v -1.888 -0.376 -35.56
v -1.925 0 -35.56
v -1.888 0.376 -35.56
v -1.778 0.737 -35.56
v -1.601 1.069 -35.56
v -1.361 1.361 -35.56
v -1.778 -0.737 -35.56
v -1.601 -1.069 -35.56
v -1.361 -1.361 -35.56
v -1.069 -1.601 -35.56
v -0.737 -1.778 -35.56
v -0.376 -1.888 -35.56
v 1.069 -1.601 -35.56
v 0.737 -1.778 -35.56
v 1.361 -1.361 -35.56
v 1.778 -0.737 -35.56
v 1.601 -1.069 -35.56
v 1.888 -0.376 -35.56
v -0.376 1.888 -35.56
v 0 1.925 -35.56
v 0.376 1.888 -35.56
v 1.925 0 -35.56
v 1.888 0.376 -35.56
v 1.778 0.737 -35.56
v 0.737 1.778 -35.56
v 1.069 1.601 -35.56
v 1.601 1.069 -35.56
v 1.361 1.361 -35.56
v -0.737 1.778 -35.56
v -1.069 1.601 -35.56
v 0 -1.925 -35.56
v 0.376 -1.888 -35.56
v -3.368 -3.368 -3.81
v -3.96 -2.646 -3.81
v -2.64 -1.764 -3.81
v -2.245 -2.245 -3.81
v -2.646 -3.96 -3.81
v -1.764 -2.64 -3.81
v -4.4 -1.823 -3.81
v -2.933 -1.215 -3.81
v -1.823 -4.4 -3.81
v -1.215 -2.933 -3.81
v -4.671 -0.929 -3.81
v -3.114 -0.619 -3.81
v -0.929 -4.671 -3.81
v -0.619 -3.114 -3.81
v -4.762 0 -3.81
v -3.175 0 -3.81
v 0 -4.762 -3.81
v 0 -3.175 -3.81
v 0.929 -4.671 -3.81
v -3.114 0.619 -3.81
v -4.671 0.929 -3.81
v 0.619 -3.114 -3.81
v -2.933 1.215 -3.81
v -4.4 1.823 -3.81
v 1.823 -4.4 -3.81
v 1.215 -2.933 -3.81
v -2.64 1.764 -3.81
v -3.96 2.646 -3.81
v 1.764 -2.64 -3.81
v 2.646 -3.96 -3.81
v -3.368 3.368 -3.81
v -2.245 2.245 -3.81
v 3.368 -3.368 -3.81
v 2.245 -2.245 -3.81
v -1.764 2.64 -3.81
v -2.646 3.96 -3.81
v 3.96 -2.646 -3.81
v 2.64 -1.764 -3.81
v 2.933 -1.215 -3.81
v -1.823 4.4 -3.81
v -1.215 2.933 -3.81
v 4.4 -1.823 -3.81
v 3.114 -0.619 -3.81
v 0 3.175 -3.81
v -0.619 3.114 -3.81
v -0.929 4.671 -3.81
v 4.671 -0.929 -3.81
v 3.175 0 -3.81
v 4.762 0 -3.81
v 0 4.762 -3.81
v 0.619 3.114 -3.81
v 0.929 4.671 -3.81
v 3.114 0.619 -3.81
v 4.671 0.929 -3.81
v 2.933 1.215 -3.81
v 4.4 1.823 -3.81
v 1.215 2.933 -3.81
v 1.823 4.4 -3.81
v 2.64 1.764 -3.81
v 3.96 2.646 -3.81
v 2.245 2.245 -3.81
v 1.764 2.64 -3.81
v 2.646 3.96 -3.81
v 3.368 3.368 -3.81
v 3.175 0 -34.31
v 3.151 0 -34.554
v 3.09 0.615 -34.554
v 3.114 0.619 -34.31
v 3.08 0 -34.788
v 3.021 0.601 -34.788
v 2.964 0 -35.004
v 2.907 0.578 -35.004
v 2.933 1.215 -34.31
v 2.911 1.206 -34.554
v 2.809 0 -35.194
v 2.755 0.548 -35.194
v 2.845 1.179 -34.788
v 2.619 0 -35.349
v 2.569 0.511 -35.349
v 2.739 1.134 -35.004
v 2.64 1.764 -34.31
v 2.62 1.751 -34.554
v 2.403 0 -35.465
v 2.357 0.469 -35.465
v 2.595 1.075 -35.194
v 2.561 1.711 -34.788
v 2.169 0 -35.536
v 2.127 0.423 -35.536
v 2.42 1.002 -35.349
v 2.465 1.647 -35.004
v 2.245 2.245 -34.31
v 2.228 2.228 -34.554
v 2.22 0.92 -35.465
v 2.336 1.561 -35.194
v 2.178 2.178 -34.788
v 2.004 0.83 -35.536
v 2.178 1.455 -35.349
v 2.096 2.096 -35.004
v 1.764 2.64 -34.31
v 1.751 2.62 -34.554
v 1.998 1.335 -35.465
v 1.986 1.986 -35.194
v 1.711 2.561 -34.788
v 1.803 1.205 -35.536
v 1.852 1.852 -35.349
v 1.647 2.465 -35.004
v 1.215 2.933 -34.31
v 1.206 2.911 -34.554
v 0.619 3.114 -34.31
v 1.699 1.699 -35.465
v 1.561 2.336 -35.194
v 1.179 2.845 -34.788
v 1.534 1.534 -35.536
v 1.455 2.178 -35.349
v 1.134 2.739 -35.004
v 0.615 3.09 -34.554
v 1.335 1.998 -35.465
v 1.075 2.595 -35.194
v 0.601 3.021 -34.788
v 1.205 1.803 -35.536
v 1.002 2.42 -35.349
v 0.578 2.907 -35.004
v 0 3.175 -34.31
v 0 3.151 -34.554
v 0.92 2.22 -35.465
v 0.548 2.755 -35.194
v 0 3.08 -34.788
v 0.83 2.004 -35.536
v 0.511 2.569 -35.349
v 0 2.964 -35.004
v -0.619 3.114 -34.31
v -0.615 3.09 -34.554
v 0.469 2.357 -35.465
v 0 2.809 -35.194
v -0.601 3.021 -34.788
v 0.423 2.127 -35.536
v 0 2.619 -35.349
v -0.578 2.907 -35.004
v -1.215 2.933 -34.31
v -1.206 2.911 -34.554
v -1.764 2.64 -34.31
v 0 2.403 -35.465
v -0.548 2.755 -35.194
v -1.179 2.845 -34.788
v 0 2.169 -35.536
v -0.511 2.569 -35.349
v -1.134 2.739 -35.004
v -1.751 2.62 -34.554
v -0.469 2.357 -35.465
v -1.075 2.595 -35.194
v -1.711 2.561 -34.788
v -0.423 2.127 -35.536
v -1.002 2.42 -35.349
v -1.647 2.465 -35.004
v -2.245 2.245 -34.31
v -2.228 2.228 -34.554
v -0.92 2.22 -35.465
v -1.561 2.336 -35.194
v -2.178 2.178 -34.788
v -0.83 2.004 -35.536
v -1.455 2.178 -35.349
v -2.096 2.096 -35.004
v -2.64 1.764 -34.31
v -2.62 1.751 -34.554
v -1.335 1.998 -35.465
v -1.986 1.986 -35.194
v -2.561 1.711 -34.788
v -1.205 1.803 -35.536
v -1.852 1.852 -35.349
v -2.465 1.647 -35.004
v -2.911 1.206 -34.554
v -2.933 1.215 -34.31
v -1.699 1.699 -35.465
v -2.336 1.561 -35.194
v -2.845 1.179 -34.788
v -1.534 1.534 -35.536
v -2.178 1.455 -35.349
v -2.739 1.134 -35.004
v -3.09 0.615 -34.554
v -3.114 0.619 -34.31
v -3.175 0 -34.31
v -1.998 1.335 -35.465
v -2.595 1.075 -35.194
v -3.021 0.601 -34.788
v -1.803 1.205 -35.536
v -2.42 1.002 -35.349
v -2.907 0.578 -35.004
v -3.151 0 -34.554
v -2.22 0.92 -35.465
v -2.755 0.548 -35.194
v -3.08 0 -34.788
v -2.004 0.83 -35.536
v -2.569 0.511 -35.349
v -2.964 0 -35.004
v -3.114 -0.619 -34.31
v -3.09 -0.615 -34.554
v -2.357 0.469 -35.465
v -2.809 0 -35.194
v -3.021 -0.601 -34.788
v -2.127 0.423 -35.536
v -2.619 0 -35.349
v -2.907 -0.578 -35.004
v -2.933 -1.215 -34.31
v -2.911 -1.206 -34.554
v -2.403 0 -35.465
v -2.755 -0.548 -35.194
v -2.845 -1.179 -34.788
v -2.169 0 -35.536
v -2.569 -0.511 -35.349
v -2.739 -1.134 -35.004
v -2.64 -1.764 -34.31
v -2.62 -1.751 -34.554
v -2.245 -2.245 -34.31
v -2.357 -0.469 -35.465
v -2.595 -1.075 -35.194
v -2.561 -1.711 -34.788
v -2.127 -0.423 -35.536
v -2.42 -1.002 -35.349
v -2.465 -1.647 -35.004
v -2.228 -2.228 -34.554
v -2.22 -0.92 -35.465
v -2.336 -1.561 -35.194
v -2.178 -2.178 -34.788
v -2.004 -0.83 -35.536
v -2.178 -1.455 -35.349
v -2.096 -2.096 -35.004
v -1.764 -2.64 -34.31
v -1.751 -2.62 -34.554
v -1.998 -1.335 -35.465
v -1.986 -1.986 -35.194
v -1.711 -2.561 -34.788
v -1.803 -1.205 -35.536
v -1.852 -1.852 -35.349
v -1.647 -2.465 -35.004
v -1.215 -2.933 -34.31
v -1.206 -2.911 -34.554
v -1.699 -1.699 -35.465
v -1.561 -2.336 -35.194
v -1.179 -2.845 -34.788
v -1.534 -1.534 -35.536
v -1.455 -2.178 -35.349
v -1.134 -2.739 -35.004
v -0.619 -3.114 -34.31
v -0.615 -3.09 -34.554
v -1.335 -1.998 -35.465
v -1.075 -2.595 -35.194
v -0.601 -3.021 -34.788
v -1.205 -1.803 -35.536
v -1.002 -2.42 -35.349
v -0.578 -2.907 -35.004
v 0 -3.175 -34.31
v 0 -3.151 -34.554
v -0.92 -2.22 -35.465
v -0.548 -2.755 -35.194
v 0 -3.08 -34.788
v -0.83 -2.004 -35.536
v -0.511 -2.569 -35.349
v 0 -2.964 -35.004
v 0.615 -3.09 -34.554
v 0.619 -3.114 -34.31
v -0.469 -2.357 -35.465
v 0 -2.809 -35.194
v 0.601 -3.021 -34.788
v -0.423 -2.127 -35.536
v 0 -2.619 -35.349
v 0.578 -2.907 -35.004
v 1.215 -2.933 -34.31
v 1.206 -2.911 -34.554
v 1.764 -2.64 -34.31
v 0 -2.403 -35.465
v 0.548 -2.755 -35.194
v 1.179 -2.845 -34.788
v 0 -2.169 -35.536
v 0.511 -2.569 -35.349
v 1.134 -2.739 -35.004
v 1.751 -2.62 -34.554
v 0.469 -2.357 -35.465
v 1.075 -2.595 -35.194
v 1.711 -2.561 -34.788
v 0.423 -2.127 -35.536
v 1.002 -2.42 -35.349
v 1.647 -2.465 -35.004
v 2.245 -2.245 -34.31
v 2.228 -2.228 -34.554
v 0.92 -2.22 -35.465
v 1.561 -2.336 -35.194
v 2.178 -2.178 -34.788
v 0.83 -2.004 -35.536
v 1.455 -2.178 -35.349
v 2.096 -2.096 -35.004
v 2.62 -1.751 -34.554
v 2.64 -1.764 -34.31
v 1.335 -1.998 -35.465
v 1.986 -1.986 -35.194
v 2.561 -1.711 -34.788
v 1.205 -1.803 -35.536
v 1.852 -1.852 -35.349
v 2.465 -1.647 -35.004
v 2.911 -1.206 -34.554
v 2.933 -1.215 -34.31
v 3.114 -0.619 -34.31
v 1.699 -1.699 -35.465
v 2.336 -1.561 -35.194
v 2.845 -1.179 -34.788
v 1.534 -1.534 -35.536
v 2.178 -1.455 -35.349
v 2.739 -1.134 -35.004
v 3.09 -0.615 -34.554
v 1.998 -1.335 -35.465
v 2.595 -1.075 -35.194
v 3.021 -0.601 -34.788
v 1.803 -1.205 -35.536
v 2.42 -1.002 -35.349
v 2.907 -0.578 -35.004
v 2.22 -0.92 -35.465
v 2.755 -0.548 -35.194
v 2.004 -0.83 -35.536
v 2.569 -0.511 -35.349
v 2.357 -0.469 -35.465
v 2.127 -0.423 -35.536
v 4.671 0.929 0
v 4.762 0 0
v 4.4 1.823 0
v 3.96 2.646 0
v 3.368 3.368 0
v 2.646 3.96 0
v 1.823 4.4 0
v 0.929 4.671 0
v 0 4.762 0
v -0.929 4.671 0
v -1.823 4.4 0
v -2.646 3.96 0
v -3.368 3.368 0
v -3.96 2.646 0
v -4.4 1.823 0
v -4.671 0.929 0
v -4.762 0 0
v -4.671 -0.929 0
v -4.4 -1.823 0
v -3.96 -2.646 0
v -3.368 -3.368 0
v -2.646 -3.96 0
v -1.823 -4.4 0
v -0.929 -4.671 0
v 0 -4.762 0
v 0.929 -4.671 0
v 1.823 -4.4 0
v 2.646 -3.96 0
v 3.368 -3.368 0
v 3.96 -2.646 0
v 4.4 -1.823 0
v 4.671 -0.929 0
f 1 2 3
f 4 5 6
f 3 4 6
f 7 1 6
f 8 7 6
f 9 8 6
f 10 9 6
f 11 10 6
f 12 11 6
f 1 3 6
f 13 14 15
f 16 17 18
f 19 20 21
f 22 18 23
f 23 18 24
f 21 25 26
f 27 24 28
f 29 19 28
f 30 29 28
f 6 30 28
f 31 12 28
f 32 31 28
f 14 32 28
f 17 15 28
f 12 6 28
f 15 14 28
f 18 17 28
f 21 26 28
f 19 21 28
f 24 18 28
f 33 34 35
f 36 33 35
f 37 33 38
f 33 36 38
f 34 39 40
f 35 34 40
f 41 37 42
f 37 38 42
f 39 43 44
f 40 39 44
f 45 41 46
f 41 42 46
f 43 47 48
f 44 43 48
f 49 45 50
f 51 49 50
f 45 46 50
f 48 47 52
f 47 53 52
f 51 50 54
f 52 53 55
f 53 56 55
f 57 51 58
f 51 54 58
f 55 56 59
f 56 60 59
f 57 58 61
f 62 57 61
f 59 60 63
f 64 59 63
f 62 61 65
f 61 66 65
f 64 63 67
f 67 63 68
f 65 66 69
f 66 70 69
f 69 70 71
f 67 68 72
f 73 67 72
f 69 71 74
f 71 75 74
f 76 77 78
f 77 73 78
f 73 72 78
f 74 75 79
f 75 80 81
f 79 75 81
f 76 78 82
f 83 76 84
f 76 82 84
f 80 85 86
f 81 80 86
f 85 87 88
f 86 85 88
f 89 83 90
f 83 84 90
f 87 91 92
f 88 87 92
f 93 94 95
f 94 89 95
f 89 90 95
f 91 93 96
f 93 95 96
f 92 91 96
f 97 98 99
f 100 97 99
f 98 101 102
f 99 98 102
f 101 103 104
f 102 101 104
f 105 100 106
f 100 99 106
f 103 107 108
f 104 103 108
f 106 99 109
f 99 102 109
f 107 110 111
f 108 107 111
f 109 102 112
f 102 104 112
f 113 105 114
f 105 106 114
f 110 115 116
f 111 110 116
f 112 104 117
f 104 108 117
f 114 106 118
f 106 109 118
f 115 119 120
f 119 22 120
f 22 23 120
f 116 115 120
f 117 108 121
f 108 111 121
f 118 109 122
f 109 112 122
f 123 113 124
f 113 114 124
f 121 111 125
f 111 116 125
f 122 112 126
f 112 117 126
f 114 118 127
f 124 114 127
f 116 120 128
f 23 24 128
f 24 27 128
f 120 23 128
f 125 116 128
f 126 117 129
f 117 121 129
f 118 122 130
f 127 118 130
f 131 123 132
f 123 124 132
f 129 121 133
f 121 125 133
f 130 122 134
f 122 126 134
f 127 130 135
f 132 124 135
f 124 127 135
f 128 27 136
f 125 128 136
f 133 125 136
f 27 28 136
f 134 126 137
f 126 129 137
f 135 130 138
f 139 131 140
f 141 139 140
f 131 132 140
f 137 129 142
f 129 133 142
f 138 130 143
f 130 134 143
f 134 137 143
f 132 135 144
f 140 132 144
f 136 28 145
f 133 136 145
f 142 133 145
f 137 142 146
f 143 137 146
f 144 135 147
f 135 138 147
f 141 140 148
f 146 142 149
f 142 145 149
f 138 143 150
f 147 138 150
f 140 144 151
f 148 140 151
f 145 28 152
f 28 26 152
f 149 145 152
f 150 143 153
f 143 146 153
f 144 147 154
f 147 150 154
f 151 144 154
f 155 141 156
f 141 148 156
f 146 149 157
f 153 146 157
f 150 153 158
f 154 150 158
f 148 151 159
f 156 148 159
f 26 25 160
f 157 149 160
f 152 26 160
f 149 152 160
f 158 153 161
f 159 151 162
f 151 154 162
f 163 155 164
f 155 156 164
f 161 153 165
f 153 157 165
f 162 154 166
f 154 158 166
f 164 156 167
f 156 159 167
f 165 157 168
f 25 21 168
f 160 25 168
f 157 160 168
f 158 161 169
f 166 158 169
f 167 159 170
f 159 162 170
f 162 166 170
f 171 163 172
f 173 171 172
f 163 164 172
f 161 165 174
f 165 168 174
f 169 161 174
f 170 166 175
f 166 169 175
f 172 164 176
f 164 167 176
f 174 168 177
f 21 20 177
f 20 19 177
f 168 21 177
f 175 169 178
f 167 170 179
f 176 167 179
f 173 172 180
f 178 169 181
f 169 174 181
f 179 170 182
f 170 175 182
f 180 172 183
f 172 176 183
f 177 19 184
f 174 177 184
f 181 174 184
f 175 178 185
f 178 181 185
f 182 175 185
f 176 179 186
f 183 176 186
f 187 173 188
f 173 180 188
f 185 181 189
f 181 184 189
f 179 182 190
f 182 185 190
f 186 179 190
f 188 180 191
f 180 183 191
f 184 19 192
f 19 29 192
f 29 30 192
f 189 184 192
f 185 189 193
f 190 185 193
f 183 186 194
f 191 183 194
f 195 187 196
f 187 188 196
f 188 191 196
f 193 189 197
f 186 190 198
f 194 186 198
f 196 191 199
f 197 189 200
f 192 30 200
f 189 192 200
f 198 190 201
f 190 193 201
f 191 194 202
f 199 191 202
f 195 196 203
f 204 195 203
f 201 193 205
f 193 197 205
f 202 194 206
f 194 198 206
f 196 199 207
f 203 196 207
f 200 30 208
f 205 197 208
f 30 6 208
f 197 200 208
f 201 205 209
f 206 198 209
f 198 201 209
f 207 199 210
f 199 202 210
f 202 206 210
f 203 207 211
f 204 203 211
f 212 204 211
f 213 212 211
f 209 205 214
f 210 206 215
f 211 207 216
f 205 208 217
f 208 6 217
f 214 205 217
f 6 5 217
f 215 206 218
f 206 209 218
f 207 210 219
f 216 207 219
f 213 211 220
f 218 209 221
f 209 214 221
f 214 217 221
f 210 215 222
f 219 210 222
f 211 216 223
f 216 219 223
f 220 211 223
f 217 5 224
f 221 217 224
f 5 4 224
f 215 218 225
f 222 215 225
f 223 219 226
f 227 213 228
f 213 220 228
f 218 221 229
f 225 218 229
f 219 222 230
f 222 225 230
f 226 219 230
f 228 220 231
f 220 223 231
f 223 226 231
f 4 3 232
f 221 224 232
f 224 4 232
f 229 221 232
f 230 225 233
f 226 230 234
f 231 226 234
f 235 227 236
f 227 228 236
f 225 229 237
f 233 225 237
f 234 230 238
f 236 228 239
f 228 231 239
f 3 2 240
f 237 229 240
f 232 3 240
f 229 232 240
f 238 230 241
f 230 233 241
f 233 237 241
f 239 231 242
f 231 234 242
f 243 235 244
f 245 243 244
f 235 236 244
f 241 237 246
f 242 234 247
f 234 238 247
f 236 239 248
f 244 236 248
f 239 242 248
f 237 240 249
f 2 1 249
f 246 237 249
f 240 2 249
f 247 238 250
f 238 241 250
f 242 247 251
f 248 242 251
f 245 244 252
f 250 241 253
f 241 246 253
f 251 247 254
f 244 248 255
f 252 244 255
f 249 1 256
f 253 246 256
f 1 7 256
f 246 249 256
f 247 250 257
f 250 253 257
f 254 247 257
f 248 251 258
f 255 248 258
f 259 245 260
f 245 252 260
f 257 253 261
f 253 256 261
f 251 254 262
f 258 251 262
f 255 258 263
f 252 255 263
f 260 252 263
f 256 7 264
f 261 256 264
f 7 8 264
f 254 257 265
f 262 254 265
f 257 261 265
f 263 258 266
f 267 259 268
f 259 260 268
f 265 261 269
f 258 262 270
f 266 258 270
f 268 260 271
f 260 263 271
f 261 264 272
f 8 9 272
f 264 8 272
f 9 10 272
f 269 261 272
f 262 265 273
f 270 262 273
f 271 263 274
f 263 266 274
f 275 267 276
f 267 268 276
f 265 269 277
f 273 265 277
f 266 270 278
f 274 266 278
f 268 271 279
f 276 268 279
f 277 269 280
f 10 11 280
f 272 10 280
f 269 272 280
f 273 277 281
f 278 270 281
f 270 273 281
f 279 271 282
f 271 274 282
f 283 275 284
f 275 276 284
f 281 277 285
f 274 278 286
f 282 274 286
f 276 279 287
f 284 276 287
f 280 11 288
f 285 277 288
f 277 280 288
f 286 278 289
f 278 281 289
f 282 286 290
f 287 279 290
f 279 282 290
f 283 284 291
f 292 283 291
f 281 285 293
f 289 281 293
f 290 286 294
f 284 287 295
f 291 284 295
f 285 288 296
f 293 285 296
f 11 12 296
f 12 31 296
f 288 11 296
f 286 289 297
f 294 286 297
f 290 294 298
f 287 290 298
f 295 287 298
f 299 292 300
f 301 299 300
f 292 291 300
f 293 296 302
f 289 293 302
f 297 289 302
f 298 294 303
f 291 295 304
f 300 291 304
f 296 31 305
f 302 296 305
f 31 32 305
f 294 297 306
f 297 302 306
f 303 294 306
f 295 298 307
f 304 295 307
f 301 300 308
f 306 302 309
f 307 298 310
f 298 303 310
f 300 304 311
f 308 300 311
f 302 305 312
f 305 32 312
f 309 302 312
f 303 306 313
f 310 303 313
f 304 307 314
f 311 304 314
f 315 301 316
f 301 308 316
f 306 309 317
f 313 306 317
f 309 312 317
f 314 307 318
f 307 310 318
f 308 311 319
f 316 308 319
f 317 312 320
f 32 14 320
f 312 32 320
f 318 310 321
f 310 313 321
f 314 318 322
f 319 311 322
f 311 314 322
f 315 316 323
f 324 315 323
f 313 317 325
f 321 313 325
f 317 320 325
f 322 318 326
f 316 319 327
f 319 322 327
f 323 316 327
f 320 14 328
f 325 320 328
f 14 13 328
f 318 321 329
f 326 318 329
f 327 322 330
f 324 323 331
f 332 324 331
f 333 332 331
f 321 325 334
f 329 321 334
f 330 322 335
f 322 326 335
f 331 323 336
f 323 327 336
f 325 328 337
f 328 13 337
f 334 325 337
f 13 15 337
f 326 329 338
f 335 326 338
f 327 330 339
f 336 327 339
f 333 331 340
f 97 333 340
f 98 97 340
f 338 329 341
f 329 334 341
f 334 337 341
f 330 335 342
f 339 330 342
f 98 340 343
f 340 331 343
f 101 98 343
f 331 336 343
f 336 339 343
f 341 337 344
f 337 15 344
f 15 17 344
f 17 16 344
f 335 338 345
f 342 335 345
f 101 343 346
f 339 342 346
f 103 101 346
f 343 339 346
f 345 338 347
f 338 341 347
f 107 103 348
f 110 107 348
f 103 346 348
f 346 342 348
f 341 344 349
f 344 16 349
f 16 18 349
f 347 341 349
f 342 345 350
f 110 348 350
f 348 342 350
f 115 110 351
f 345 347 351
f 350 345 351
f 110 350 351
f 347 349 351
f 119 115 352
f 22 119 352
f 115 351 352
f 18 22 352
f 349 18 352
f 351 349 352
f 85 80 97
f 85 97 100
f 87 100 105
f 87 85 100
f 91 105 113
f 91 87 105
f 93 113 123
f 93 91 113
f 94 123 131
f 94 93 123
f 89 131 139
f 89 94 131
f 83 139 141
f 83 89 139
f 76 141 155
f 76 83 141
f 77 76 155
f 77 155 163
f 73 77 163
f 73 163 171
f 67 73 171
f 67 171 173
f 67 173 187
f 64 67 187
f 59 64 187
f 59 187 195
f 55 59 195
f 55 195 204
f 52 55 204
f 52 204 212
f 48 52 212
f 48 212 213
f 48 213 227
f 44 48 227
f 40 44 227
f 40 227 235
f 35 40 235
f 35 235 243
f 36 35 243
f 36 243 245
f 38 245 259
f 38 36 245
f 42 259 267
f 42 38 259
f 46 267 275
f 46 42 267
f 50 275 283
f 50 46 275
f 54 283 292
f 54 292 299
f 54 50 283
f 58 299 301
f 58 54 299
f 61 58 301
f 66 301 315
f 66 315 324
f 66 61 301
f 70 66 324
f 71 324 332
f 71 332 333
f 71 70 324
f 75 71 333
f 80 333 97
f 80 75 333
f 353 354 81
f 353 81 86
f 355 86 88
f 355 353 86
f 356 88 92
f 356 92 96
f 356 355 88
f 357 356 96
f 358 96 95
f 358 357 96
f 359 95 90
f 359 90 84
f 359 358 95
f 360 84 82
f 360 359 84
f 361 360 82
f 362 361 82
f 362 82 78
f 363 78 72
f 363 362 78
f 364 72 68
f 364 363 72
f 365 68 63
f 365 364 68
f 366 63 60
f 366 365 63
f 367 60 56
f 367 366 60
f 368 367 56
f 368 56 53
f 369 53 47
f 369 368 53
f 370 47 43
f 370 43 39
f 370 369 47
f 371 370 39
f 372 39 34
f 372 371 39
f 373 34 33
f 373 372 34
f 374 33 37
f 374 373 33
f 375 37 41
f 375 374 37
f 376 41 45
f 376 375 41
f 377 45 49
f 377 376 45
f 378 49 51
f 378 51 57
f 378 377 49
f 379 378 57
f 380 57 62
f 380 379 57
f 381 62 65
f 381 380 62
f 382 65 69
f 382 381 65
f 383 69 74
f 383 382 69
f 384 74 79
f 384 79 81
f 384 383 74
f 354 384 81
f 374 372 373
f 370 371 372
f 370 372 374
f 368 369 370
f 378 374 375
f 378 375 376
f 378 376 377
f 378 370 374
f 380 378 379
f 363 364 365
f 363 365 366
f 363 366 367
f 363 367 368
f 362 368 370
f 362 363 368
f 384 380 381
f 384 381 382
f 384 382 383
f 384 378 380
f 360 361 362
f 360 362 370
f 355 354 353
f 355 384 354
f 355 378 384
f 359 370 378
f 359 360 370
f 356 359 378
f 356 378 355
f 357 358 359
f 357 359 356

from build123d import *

# Parameters (mm, degrees)
F0_R     = 3.175
F1_DEPTH = 35.56
F2_R     = 4.7625
F3_DEPTH = 3.81
F4_R     = 1.25


with BuildPart() as f1:
    # F0 (on Top) → F1 (new body)
    with BuildSketch(Plane.XY):
        Circle(F0_R)
    extrude(amount=-F1_DEPTH)

    # F2 (on Top) → F3 (join)
    with BuildSketch(Plane.XY):
        Circle(F2_R)
    extrude(amount=-F3_DEPTH)

    # F4
    f4_edges = [f1.edges().sort_by_distance(p)[0] for p in [
        (-3.175, 0, -35.56),
    ]]
    fillet(f4_edges, radius=F4_R)


solid = f1.part
